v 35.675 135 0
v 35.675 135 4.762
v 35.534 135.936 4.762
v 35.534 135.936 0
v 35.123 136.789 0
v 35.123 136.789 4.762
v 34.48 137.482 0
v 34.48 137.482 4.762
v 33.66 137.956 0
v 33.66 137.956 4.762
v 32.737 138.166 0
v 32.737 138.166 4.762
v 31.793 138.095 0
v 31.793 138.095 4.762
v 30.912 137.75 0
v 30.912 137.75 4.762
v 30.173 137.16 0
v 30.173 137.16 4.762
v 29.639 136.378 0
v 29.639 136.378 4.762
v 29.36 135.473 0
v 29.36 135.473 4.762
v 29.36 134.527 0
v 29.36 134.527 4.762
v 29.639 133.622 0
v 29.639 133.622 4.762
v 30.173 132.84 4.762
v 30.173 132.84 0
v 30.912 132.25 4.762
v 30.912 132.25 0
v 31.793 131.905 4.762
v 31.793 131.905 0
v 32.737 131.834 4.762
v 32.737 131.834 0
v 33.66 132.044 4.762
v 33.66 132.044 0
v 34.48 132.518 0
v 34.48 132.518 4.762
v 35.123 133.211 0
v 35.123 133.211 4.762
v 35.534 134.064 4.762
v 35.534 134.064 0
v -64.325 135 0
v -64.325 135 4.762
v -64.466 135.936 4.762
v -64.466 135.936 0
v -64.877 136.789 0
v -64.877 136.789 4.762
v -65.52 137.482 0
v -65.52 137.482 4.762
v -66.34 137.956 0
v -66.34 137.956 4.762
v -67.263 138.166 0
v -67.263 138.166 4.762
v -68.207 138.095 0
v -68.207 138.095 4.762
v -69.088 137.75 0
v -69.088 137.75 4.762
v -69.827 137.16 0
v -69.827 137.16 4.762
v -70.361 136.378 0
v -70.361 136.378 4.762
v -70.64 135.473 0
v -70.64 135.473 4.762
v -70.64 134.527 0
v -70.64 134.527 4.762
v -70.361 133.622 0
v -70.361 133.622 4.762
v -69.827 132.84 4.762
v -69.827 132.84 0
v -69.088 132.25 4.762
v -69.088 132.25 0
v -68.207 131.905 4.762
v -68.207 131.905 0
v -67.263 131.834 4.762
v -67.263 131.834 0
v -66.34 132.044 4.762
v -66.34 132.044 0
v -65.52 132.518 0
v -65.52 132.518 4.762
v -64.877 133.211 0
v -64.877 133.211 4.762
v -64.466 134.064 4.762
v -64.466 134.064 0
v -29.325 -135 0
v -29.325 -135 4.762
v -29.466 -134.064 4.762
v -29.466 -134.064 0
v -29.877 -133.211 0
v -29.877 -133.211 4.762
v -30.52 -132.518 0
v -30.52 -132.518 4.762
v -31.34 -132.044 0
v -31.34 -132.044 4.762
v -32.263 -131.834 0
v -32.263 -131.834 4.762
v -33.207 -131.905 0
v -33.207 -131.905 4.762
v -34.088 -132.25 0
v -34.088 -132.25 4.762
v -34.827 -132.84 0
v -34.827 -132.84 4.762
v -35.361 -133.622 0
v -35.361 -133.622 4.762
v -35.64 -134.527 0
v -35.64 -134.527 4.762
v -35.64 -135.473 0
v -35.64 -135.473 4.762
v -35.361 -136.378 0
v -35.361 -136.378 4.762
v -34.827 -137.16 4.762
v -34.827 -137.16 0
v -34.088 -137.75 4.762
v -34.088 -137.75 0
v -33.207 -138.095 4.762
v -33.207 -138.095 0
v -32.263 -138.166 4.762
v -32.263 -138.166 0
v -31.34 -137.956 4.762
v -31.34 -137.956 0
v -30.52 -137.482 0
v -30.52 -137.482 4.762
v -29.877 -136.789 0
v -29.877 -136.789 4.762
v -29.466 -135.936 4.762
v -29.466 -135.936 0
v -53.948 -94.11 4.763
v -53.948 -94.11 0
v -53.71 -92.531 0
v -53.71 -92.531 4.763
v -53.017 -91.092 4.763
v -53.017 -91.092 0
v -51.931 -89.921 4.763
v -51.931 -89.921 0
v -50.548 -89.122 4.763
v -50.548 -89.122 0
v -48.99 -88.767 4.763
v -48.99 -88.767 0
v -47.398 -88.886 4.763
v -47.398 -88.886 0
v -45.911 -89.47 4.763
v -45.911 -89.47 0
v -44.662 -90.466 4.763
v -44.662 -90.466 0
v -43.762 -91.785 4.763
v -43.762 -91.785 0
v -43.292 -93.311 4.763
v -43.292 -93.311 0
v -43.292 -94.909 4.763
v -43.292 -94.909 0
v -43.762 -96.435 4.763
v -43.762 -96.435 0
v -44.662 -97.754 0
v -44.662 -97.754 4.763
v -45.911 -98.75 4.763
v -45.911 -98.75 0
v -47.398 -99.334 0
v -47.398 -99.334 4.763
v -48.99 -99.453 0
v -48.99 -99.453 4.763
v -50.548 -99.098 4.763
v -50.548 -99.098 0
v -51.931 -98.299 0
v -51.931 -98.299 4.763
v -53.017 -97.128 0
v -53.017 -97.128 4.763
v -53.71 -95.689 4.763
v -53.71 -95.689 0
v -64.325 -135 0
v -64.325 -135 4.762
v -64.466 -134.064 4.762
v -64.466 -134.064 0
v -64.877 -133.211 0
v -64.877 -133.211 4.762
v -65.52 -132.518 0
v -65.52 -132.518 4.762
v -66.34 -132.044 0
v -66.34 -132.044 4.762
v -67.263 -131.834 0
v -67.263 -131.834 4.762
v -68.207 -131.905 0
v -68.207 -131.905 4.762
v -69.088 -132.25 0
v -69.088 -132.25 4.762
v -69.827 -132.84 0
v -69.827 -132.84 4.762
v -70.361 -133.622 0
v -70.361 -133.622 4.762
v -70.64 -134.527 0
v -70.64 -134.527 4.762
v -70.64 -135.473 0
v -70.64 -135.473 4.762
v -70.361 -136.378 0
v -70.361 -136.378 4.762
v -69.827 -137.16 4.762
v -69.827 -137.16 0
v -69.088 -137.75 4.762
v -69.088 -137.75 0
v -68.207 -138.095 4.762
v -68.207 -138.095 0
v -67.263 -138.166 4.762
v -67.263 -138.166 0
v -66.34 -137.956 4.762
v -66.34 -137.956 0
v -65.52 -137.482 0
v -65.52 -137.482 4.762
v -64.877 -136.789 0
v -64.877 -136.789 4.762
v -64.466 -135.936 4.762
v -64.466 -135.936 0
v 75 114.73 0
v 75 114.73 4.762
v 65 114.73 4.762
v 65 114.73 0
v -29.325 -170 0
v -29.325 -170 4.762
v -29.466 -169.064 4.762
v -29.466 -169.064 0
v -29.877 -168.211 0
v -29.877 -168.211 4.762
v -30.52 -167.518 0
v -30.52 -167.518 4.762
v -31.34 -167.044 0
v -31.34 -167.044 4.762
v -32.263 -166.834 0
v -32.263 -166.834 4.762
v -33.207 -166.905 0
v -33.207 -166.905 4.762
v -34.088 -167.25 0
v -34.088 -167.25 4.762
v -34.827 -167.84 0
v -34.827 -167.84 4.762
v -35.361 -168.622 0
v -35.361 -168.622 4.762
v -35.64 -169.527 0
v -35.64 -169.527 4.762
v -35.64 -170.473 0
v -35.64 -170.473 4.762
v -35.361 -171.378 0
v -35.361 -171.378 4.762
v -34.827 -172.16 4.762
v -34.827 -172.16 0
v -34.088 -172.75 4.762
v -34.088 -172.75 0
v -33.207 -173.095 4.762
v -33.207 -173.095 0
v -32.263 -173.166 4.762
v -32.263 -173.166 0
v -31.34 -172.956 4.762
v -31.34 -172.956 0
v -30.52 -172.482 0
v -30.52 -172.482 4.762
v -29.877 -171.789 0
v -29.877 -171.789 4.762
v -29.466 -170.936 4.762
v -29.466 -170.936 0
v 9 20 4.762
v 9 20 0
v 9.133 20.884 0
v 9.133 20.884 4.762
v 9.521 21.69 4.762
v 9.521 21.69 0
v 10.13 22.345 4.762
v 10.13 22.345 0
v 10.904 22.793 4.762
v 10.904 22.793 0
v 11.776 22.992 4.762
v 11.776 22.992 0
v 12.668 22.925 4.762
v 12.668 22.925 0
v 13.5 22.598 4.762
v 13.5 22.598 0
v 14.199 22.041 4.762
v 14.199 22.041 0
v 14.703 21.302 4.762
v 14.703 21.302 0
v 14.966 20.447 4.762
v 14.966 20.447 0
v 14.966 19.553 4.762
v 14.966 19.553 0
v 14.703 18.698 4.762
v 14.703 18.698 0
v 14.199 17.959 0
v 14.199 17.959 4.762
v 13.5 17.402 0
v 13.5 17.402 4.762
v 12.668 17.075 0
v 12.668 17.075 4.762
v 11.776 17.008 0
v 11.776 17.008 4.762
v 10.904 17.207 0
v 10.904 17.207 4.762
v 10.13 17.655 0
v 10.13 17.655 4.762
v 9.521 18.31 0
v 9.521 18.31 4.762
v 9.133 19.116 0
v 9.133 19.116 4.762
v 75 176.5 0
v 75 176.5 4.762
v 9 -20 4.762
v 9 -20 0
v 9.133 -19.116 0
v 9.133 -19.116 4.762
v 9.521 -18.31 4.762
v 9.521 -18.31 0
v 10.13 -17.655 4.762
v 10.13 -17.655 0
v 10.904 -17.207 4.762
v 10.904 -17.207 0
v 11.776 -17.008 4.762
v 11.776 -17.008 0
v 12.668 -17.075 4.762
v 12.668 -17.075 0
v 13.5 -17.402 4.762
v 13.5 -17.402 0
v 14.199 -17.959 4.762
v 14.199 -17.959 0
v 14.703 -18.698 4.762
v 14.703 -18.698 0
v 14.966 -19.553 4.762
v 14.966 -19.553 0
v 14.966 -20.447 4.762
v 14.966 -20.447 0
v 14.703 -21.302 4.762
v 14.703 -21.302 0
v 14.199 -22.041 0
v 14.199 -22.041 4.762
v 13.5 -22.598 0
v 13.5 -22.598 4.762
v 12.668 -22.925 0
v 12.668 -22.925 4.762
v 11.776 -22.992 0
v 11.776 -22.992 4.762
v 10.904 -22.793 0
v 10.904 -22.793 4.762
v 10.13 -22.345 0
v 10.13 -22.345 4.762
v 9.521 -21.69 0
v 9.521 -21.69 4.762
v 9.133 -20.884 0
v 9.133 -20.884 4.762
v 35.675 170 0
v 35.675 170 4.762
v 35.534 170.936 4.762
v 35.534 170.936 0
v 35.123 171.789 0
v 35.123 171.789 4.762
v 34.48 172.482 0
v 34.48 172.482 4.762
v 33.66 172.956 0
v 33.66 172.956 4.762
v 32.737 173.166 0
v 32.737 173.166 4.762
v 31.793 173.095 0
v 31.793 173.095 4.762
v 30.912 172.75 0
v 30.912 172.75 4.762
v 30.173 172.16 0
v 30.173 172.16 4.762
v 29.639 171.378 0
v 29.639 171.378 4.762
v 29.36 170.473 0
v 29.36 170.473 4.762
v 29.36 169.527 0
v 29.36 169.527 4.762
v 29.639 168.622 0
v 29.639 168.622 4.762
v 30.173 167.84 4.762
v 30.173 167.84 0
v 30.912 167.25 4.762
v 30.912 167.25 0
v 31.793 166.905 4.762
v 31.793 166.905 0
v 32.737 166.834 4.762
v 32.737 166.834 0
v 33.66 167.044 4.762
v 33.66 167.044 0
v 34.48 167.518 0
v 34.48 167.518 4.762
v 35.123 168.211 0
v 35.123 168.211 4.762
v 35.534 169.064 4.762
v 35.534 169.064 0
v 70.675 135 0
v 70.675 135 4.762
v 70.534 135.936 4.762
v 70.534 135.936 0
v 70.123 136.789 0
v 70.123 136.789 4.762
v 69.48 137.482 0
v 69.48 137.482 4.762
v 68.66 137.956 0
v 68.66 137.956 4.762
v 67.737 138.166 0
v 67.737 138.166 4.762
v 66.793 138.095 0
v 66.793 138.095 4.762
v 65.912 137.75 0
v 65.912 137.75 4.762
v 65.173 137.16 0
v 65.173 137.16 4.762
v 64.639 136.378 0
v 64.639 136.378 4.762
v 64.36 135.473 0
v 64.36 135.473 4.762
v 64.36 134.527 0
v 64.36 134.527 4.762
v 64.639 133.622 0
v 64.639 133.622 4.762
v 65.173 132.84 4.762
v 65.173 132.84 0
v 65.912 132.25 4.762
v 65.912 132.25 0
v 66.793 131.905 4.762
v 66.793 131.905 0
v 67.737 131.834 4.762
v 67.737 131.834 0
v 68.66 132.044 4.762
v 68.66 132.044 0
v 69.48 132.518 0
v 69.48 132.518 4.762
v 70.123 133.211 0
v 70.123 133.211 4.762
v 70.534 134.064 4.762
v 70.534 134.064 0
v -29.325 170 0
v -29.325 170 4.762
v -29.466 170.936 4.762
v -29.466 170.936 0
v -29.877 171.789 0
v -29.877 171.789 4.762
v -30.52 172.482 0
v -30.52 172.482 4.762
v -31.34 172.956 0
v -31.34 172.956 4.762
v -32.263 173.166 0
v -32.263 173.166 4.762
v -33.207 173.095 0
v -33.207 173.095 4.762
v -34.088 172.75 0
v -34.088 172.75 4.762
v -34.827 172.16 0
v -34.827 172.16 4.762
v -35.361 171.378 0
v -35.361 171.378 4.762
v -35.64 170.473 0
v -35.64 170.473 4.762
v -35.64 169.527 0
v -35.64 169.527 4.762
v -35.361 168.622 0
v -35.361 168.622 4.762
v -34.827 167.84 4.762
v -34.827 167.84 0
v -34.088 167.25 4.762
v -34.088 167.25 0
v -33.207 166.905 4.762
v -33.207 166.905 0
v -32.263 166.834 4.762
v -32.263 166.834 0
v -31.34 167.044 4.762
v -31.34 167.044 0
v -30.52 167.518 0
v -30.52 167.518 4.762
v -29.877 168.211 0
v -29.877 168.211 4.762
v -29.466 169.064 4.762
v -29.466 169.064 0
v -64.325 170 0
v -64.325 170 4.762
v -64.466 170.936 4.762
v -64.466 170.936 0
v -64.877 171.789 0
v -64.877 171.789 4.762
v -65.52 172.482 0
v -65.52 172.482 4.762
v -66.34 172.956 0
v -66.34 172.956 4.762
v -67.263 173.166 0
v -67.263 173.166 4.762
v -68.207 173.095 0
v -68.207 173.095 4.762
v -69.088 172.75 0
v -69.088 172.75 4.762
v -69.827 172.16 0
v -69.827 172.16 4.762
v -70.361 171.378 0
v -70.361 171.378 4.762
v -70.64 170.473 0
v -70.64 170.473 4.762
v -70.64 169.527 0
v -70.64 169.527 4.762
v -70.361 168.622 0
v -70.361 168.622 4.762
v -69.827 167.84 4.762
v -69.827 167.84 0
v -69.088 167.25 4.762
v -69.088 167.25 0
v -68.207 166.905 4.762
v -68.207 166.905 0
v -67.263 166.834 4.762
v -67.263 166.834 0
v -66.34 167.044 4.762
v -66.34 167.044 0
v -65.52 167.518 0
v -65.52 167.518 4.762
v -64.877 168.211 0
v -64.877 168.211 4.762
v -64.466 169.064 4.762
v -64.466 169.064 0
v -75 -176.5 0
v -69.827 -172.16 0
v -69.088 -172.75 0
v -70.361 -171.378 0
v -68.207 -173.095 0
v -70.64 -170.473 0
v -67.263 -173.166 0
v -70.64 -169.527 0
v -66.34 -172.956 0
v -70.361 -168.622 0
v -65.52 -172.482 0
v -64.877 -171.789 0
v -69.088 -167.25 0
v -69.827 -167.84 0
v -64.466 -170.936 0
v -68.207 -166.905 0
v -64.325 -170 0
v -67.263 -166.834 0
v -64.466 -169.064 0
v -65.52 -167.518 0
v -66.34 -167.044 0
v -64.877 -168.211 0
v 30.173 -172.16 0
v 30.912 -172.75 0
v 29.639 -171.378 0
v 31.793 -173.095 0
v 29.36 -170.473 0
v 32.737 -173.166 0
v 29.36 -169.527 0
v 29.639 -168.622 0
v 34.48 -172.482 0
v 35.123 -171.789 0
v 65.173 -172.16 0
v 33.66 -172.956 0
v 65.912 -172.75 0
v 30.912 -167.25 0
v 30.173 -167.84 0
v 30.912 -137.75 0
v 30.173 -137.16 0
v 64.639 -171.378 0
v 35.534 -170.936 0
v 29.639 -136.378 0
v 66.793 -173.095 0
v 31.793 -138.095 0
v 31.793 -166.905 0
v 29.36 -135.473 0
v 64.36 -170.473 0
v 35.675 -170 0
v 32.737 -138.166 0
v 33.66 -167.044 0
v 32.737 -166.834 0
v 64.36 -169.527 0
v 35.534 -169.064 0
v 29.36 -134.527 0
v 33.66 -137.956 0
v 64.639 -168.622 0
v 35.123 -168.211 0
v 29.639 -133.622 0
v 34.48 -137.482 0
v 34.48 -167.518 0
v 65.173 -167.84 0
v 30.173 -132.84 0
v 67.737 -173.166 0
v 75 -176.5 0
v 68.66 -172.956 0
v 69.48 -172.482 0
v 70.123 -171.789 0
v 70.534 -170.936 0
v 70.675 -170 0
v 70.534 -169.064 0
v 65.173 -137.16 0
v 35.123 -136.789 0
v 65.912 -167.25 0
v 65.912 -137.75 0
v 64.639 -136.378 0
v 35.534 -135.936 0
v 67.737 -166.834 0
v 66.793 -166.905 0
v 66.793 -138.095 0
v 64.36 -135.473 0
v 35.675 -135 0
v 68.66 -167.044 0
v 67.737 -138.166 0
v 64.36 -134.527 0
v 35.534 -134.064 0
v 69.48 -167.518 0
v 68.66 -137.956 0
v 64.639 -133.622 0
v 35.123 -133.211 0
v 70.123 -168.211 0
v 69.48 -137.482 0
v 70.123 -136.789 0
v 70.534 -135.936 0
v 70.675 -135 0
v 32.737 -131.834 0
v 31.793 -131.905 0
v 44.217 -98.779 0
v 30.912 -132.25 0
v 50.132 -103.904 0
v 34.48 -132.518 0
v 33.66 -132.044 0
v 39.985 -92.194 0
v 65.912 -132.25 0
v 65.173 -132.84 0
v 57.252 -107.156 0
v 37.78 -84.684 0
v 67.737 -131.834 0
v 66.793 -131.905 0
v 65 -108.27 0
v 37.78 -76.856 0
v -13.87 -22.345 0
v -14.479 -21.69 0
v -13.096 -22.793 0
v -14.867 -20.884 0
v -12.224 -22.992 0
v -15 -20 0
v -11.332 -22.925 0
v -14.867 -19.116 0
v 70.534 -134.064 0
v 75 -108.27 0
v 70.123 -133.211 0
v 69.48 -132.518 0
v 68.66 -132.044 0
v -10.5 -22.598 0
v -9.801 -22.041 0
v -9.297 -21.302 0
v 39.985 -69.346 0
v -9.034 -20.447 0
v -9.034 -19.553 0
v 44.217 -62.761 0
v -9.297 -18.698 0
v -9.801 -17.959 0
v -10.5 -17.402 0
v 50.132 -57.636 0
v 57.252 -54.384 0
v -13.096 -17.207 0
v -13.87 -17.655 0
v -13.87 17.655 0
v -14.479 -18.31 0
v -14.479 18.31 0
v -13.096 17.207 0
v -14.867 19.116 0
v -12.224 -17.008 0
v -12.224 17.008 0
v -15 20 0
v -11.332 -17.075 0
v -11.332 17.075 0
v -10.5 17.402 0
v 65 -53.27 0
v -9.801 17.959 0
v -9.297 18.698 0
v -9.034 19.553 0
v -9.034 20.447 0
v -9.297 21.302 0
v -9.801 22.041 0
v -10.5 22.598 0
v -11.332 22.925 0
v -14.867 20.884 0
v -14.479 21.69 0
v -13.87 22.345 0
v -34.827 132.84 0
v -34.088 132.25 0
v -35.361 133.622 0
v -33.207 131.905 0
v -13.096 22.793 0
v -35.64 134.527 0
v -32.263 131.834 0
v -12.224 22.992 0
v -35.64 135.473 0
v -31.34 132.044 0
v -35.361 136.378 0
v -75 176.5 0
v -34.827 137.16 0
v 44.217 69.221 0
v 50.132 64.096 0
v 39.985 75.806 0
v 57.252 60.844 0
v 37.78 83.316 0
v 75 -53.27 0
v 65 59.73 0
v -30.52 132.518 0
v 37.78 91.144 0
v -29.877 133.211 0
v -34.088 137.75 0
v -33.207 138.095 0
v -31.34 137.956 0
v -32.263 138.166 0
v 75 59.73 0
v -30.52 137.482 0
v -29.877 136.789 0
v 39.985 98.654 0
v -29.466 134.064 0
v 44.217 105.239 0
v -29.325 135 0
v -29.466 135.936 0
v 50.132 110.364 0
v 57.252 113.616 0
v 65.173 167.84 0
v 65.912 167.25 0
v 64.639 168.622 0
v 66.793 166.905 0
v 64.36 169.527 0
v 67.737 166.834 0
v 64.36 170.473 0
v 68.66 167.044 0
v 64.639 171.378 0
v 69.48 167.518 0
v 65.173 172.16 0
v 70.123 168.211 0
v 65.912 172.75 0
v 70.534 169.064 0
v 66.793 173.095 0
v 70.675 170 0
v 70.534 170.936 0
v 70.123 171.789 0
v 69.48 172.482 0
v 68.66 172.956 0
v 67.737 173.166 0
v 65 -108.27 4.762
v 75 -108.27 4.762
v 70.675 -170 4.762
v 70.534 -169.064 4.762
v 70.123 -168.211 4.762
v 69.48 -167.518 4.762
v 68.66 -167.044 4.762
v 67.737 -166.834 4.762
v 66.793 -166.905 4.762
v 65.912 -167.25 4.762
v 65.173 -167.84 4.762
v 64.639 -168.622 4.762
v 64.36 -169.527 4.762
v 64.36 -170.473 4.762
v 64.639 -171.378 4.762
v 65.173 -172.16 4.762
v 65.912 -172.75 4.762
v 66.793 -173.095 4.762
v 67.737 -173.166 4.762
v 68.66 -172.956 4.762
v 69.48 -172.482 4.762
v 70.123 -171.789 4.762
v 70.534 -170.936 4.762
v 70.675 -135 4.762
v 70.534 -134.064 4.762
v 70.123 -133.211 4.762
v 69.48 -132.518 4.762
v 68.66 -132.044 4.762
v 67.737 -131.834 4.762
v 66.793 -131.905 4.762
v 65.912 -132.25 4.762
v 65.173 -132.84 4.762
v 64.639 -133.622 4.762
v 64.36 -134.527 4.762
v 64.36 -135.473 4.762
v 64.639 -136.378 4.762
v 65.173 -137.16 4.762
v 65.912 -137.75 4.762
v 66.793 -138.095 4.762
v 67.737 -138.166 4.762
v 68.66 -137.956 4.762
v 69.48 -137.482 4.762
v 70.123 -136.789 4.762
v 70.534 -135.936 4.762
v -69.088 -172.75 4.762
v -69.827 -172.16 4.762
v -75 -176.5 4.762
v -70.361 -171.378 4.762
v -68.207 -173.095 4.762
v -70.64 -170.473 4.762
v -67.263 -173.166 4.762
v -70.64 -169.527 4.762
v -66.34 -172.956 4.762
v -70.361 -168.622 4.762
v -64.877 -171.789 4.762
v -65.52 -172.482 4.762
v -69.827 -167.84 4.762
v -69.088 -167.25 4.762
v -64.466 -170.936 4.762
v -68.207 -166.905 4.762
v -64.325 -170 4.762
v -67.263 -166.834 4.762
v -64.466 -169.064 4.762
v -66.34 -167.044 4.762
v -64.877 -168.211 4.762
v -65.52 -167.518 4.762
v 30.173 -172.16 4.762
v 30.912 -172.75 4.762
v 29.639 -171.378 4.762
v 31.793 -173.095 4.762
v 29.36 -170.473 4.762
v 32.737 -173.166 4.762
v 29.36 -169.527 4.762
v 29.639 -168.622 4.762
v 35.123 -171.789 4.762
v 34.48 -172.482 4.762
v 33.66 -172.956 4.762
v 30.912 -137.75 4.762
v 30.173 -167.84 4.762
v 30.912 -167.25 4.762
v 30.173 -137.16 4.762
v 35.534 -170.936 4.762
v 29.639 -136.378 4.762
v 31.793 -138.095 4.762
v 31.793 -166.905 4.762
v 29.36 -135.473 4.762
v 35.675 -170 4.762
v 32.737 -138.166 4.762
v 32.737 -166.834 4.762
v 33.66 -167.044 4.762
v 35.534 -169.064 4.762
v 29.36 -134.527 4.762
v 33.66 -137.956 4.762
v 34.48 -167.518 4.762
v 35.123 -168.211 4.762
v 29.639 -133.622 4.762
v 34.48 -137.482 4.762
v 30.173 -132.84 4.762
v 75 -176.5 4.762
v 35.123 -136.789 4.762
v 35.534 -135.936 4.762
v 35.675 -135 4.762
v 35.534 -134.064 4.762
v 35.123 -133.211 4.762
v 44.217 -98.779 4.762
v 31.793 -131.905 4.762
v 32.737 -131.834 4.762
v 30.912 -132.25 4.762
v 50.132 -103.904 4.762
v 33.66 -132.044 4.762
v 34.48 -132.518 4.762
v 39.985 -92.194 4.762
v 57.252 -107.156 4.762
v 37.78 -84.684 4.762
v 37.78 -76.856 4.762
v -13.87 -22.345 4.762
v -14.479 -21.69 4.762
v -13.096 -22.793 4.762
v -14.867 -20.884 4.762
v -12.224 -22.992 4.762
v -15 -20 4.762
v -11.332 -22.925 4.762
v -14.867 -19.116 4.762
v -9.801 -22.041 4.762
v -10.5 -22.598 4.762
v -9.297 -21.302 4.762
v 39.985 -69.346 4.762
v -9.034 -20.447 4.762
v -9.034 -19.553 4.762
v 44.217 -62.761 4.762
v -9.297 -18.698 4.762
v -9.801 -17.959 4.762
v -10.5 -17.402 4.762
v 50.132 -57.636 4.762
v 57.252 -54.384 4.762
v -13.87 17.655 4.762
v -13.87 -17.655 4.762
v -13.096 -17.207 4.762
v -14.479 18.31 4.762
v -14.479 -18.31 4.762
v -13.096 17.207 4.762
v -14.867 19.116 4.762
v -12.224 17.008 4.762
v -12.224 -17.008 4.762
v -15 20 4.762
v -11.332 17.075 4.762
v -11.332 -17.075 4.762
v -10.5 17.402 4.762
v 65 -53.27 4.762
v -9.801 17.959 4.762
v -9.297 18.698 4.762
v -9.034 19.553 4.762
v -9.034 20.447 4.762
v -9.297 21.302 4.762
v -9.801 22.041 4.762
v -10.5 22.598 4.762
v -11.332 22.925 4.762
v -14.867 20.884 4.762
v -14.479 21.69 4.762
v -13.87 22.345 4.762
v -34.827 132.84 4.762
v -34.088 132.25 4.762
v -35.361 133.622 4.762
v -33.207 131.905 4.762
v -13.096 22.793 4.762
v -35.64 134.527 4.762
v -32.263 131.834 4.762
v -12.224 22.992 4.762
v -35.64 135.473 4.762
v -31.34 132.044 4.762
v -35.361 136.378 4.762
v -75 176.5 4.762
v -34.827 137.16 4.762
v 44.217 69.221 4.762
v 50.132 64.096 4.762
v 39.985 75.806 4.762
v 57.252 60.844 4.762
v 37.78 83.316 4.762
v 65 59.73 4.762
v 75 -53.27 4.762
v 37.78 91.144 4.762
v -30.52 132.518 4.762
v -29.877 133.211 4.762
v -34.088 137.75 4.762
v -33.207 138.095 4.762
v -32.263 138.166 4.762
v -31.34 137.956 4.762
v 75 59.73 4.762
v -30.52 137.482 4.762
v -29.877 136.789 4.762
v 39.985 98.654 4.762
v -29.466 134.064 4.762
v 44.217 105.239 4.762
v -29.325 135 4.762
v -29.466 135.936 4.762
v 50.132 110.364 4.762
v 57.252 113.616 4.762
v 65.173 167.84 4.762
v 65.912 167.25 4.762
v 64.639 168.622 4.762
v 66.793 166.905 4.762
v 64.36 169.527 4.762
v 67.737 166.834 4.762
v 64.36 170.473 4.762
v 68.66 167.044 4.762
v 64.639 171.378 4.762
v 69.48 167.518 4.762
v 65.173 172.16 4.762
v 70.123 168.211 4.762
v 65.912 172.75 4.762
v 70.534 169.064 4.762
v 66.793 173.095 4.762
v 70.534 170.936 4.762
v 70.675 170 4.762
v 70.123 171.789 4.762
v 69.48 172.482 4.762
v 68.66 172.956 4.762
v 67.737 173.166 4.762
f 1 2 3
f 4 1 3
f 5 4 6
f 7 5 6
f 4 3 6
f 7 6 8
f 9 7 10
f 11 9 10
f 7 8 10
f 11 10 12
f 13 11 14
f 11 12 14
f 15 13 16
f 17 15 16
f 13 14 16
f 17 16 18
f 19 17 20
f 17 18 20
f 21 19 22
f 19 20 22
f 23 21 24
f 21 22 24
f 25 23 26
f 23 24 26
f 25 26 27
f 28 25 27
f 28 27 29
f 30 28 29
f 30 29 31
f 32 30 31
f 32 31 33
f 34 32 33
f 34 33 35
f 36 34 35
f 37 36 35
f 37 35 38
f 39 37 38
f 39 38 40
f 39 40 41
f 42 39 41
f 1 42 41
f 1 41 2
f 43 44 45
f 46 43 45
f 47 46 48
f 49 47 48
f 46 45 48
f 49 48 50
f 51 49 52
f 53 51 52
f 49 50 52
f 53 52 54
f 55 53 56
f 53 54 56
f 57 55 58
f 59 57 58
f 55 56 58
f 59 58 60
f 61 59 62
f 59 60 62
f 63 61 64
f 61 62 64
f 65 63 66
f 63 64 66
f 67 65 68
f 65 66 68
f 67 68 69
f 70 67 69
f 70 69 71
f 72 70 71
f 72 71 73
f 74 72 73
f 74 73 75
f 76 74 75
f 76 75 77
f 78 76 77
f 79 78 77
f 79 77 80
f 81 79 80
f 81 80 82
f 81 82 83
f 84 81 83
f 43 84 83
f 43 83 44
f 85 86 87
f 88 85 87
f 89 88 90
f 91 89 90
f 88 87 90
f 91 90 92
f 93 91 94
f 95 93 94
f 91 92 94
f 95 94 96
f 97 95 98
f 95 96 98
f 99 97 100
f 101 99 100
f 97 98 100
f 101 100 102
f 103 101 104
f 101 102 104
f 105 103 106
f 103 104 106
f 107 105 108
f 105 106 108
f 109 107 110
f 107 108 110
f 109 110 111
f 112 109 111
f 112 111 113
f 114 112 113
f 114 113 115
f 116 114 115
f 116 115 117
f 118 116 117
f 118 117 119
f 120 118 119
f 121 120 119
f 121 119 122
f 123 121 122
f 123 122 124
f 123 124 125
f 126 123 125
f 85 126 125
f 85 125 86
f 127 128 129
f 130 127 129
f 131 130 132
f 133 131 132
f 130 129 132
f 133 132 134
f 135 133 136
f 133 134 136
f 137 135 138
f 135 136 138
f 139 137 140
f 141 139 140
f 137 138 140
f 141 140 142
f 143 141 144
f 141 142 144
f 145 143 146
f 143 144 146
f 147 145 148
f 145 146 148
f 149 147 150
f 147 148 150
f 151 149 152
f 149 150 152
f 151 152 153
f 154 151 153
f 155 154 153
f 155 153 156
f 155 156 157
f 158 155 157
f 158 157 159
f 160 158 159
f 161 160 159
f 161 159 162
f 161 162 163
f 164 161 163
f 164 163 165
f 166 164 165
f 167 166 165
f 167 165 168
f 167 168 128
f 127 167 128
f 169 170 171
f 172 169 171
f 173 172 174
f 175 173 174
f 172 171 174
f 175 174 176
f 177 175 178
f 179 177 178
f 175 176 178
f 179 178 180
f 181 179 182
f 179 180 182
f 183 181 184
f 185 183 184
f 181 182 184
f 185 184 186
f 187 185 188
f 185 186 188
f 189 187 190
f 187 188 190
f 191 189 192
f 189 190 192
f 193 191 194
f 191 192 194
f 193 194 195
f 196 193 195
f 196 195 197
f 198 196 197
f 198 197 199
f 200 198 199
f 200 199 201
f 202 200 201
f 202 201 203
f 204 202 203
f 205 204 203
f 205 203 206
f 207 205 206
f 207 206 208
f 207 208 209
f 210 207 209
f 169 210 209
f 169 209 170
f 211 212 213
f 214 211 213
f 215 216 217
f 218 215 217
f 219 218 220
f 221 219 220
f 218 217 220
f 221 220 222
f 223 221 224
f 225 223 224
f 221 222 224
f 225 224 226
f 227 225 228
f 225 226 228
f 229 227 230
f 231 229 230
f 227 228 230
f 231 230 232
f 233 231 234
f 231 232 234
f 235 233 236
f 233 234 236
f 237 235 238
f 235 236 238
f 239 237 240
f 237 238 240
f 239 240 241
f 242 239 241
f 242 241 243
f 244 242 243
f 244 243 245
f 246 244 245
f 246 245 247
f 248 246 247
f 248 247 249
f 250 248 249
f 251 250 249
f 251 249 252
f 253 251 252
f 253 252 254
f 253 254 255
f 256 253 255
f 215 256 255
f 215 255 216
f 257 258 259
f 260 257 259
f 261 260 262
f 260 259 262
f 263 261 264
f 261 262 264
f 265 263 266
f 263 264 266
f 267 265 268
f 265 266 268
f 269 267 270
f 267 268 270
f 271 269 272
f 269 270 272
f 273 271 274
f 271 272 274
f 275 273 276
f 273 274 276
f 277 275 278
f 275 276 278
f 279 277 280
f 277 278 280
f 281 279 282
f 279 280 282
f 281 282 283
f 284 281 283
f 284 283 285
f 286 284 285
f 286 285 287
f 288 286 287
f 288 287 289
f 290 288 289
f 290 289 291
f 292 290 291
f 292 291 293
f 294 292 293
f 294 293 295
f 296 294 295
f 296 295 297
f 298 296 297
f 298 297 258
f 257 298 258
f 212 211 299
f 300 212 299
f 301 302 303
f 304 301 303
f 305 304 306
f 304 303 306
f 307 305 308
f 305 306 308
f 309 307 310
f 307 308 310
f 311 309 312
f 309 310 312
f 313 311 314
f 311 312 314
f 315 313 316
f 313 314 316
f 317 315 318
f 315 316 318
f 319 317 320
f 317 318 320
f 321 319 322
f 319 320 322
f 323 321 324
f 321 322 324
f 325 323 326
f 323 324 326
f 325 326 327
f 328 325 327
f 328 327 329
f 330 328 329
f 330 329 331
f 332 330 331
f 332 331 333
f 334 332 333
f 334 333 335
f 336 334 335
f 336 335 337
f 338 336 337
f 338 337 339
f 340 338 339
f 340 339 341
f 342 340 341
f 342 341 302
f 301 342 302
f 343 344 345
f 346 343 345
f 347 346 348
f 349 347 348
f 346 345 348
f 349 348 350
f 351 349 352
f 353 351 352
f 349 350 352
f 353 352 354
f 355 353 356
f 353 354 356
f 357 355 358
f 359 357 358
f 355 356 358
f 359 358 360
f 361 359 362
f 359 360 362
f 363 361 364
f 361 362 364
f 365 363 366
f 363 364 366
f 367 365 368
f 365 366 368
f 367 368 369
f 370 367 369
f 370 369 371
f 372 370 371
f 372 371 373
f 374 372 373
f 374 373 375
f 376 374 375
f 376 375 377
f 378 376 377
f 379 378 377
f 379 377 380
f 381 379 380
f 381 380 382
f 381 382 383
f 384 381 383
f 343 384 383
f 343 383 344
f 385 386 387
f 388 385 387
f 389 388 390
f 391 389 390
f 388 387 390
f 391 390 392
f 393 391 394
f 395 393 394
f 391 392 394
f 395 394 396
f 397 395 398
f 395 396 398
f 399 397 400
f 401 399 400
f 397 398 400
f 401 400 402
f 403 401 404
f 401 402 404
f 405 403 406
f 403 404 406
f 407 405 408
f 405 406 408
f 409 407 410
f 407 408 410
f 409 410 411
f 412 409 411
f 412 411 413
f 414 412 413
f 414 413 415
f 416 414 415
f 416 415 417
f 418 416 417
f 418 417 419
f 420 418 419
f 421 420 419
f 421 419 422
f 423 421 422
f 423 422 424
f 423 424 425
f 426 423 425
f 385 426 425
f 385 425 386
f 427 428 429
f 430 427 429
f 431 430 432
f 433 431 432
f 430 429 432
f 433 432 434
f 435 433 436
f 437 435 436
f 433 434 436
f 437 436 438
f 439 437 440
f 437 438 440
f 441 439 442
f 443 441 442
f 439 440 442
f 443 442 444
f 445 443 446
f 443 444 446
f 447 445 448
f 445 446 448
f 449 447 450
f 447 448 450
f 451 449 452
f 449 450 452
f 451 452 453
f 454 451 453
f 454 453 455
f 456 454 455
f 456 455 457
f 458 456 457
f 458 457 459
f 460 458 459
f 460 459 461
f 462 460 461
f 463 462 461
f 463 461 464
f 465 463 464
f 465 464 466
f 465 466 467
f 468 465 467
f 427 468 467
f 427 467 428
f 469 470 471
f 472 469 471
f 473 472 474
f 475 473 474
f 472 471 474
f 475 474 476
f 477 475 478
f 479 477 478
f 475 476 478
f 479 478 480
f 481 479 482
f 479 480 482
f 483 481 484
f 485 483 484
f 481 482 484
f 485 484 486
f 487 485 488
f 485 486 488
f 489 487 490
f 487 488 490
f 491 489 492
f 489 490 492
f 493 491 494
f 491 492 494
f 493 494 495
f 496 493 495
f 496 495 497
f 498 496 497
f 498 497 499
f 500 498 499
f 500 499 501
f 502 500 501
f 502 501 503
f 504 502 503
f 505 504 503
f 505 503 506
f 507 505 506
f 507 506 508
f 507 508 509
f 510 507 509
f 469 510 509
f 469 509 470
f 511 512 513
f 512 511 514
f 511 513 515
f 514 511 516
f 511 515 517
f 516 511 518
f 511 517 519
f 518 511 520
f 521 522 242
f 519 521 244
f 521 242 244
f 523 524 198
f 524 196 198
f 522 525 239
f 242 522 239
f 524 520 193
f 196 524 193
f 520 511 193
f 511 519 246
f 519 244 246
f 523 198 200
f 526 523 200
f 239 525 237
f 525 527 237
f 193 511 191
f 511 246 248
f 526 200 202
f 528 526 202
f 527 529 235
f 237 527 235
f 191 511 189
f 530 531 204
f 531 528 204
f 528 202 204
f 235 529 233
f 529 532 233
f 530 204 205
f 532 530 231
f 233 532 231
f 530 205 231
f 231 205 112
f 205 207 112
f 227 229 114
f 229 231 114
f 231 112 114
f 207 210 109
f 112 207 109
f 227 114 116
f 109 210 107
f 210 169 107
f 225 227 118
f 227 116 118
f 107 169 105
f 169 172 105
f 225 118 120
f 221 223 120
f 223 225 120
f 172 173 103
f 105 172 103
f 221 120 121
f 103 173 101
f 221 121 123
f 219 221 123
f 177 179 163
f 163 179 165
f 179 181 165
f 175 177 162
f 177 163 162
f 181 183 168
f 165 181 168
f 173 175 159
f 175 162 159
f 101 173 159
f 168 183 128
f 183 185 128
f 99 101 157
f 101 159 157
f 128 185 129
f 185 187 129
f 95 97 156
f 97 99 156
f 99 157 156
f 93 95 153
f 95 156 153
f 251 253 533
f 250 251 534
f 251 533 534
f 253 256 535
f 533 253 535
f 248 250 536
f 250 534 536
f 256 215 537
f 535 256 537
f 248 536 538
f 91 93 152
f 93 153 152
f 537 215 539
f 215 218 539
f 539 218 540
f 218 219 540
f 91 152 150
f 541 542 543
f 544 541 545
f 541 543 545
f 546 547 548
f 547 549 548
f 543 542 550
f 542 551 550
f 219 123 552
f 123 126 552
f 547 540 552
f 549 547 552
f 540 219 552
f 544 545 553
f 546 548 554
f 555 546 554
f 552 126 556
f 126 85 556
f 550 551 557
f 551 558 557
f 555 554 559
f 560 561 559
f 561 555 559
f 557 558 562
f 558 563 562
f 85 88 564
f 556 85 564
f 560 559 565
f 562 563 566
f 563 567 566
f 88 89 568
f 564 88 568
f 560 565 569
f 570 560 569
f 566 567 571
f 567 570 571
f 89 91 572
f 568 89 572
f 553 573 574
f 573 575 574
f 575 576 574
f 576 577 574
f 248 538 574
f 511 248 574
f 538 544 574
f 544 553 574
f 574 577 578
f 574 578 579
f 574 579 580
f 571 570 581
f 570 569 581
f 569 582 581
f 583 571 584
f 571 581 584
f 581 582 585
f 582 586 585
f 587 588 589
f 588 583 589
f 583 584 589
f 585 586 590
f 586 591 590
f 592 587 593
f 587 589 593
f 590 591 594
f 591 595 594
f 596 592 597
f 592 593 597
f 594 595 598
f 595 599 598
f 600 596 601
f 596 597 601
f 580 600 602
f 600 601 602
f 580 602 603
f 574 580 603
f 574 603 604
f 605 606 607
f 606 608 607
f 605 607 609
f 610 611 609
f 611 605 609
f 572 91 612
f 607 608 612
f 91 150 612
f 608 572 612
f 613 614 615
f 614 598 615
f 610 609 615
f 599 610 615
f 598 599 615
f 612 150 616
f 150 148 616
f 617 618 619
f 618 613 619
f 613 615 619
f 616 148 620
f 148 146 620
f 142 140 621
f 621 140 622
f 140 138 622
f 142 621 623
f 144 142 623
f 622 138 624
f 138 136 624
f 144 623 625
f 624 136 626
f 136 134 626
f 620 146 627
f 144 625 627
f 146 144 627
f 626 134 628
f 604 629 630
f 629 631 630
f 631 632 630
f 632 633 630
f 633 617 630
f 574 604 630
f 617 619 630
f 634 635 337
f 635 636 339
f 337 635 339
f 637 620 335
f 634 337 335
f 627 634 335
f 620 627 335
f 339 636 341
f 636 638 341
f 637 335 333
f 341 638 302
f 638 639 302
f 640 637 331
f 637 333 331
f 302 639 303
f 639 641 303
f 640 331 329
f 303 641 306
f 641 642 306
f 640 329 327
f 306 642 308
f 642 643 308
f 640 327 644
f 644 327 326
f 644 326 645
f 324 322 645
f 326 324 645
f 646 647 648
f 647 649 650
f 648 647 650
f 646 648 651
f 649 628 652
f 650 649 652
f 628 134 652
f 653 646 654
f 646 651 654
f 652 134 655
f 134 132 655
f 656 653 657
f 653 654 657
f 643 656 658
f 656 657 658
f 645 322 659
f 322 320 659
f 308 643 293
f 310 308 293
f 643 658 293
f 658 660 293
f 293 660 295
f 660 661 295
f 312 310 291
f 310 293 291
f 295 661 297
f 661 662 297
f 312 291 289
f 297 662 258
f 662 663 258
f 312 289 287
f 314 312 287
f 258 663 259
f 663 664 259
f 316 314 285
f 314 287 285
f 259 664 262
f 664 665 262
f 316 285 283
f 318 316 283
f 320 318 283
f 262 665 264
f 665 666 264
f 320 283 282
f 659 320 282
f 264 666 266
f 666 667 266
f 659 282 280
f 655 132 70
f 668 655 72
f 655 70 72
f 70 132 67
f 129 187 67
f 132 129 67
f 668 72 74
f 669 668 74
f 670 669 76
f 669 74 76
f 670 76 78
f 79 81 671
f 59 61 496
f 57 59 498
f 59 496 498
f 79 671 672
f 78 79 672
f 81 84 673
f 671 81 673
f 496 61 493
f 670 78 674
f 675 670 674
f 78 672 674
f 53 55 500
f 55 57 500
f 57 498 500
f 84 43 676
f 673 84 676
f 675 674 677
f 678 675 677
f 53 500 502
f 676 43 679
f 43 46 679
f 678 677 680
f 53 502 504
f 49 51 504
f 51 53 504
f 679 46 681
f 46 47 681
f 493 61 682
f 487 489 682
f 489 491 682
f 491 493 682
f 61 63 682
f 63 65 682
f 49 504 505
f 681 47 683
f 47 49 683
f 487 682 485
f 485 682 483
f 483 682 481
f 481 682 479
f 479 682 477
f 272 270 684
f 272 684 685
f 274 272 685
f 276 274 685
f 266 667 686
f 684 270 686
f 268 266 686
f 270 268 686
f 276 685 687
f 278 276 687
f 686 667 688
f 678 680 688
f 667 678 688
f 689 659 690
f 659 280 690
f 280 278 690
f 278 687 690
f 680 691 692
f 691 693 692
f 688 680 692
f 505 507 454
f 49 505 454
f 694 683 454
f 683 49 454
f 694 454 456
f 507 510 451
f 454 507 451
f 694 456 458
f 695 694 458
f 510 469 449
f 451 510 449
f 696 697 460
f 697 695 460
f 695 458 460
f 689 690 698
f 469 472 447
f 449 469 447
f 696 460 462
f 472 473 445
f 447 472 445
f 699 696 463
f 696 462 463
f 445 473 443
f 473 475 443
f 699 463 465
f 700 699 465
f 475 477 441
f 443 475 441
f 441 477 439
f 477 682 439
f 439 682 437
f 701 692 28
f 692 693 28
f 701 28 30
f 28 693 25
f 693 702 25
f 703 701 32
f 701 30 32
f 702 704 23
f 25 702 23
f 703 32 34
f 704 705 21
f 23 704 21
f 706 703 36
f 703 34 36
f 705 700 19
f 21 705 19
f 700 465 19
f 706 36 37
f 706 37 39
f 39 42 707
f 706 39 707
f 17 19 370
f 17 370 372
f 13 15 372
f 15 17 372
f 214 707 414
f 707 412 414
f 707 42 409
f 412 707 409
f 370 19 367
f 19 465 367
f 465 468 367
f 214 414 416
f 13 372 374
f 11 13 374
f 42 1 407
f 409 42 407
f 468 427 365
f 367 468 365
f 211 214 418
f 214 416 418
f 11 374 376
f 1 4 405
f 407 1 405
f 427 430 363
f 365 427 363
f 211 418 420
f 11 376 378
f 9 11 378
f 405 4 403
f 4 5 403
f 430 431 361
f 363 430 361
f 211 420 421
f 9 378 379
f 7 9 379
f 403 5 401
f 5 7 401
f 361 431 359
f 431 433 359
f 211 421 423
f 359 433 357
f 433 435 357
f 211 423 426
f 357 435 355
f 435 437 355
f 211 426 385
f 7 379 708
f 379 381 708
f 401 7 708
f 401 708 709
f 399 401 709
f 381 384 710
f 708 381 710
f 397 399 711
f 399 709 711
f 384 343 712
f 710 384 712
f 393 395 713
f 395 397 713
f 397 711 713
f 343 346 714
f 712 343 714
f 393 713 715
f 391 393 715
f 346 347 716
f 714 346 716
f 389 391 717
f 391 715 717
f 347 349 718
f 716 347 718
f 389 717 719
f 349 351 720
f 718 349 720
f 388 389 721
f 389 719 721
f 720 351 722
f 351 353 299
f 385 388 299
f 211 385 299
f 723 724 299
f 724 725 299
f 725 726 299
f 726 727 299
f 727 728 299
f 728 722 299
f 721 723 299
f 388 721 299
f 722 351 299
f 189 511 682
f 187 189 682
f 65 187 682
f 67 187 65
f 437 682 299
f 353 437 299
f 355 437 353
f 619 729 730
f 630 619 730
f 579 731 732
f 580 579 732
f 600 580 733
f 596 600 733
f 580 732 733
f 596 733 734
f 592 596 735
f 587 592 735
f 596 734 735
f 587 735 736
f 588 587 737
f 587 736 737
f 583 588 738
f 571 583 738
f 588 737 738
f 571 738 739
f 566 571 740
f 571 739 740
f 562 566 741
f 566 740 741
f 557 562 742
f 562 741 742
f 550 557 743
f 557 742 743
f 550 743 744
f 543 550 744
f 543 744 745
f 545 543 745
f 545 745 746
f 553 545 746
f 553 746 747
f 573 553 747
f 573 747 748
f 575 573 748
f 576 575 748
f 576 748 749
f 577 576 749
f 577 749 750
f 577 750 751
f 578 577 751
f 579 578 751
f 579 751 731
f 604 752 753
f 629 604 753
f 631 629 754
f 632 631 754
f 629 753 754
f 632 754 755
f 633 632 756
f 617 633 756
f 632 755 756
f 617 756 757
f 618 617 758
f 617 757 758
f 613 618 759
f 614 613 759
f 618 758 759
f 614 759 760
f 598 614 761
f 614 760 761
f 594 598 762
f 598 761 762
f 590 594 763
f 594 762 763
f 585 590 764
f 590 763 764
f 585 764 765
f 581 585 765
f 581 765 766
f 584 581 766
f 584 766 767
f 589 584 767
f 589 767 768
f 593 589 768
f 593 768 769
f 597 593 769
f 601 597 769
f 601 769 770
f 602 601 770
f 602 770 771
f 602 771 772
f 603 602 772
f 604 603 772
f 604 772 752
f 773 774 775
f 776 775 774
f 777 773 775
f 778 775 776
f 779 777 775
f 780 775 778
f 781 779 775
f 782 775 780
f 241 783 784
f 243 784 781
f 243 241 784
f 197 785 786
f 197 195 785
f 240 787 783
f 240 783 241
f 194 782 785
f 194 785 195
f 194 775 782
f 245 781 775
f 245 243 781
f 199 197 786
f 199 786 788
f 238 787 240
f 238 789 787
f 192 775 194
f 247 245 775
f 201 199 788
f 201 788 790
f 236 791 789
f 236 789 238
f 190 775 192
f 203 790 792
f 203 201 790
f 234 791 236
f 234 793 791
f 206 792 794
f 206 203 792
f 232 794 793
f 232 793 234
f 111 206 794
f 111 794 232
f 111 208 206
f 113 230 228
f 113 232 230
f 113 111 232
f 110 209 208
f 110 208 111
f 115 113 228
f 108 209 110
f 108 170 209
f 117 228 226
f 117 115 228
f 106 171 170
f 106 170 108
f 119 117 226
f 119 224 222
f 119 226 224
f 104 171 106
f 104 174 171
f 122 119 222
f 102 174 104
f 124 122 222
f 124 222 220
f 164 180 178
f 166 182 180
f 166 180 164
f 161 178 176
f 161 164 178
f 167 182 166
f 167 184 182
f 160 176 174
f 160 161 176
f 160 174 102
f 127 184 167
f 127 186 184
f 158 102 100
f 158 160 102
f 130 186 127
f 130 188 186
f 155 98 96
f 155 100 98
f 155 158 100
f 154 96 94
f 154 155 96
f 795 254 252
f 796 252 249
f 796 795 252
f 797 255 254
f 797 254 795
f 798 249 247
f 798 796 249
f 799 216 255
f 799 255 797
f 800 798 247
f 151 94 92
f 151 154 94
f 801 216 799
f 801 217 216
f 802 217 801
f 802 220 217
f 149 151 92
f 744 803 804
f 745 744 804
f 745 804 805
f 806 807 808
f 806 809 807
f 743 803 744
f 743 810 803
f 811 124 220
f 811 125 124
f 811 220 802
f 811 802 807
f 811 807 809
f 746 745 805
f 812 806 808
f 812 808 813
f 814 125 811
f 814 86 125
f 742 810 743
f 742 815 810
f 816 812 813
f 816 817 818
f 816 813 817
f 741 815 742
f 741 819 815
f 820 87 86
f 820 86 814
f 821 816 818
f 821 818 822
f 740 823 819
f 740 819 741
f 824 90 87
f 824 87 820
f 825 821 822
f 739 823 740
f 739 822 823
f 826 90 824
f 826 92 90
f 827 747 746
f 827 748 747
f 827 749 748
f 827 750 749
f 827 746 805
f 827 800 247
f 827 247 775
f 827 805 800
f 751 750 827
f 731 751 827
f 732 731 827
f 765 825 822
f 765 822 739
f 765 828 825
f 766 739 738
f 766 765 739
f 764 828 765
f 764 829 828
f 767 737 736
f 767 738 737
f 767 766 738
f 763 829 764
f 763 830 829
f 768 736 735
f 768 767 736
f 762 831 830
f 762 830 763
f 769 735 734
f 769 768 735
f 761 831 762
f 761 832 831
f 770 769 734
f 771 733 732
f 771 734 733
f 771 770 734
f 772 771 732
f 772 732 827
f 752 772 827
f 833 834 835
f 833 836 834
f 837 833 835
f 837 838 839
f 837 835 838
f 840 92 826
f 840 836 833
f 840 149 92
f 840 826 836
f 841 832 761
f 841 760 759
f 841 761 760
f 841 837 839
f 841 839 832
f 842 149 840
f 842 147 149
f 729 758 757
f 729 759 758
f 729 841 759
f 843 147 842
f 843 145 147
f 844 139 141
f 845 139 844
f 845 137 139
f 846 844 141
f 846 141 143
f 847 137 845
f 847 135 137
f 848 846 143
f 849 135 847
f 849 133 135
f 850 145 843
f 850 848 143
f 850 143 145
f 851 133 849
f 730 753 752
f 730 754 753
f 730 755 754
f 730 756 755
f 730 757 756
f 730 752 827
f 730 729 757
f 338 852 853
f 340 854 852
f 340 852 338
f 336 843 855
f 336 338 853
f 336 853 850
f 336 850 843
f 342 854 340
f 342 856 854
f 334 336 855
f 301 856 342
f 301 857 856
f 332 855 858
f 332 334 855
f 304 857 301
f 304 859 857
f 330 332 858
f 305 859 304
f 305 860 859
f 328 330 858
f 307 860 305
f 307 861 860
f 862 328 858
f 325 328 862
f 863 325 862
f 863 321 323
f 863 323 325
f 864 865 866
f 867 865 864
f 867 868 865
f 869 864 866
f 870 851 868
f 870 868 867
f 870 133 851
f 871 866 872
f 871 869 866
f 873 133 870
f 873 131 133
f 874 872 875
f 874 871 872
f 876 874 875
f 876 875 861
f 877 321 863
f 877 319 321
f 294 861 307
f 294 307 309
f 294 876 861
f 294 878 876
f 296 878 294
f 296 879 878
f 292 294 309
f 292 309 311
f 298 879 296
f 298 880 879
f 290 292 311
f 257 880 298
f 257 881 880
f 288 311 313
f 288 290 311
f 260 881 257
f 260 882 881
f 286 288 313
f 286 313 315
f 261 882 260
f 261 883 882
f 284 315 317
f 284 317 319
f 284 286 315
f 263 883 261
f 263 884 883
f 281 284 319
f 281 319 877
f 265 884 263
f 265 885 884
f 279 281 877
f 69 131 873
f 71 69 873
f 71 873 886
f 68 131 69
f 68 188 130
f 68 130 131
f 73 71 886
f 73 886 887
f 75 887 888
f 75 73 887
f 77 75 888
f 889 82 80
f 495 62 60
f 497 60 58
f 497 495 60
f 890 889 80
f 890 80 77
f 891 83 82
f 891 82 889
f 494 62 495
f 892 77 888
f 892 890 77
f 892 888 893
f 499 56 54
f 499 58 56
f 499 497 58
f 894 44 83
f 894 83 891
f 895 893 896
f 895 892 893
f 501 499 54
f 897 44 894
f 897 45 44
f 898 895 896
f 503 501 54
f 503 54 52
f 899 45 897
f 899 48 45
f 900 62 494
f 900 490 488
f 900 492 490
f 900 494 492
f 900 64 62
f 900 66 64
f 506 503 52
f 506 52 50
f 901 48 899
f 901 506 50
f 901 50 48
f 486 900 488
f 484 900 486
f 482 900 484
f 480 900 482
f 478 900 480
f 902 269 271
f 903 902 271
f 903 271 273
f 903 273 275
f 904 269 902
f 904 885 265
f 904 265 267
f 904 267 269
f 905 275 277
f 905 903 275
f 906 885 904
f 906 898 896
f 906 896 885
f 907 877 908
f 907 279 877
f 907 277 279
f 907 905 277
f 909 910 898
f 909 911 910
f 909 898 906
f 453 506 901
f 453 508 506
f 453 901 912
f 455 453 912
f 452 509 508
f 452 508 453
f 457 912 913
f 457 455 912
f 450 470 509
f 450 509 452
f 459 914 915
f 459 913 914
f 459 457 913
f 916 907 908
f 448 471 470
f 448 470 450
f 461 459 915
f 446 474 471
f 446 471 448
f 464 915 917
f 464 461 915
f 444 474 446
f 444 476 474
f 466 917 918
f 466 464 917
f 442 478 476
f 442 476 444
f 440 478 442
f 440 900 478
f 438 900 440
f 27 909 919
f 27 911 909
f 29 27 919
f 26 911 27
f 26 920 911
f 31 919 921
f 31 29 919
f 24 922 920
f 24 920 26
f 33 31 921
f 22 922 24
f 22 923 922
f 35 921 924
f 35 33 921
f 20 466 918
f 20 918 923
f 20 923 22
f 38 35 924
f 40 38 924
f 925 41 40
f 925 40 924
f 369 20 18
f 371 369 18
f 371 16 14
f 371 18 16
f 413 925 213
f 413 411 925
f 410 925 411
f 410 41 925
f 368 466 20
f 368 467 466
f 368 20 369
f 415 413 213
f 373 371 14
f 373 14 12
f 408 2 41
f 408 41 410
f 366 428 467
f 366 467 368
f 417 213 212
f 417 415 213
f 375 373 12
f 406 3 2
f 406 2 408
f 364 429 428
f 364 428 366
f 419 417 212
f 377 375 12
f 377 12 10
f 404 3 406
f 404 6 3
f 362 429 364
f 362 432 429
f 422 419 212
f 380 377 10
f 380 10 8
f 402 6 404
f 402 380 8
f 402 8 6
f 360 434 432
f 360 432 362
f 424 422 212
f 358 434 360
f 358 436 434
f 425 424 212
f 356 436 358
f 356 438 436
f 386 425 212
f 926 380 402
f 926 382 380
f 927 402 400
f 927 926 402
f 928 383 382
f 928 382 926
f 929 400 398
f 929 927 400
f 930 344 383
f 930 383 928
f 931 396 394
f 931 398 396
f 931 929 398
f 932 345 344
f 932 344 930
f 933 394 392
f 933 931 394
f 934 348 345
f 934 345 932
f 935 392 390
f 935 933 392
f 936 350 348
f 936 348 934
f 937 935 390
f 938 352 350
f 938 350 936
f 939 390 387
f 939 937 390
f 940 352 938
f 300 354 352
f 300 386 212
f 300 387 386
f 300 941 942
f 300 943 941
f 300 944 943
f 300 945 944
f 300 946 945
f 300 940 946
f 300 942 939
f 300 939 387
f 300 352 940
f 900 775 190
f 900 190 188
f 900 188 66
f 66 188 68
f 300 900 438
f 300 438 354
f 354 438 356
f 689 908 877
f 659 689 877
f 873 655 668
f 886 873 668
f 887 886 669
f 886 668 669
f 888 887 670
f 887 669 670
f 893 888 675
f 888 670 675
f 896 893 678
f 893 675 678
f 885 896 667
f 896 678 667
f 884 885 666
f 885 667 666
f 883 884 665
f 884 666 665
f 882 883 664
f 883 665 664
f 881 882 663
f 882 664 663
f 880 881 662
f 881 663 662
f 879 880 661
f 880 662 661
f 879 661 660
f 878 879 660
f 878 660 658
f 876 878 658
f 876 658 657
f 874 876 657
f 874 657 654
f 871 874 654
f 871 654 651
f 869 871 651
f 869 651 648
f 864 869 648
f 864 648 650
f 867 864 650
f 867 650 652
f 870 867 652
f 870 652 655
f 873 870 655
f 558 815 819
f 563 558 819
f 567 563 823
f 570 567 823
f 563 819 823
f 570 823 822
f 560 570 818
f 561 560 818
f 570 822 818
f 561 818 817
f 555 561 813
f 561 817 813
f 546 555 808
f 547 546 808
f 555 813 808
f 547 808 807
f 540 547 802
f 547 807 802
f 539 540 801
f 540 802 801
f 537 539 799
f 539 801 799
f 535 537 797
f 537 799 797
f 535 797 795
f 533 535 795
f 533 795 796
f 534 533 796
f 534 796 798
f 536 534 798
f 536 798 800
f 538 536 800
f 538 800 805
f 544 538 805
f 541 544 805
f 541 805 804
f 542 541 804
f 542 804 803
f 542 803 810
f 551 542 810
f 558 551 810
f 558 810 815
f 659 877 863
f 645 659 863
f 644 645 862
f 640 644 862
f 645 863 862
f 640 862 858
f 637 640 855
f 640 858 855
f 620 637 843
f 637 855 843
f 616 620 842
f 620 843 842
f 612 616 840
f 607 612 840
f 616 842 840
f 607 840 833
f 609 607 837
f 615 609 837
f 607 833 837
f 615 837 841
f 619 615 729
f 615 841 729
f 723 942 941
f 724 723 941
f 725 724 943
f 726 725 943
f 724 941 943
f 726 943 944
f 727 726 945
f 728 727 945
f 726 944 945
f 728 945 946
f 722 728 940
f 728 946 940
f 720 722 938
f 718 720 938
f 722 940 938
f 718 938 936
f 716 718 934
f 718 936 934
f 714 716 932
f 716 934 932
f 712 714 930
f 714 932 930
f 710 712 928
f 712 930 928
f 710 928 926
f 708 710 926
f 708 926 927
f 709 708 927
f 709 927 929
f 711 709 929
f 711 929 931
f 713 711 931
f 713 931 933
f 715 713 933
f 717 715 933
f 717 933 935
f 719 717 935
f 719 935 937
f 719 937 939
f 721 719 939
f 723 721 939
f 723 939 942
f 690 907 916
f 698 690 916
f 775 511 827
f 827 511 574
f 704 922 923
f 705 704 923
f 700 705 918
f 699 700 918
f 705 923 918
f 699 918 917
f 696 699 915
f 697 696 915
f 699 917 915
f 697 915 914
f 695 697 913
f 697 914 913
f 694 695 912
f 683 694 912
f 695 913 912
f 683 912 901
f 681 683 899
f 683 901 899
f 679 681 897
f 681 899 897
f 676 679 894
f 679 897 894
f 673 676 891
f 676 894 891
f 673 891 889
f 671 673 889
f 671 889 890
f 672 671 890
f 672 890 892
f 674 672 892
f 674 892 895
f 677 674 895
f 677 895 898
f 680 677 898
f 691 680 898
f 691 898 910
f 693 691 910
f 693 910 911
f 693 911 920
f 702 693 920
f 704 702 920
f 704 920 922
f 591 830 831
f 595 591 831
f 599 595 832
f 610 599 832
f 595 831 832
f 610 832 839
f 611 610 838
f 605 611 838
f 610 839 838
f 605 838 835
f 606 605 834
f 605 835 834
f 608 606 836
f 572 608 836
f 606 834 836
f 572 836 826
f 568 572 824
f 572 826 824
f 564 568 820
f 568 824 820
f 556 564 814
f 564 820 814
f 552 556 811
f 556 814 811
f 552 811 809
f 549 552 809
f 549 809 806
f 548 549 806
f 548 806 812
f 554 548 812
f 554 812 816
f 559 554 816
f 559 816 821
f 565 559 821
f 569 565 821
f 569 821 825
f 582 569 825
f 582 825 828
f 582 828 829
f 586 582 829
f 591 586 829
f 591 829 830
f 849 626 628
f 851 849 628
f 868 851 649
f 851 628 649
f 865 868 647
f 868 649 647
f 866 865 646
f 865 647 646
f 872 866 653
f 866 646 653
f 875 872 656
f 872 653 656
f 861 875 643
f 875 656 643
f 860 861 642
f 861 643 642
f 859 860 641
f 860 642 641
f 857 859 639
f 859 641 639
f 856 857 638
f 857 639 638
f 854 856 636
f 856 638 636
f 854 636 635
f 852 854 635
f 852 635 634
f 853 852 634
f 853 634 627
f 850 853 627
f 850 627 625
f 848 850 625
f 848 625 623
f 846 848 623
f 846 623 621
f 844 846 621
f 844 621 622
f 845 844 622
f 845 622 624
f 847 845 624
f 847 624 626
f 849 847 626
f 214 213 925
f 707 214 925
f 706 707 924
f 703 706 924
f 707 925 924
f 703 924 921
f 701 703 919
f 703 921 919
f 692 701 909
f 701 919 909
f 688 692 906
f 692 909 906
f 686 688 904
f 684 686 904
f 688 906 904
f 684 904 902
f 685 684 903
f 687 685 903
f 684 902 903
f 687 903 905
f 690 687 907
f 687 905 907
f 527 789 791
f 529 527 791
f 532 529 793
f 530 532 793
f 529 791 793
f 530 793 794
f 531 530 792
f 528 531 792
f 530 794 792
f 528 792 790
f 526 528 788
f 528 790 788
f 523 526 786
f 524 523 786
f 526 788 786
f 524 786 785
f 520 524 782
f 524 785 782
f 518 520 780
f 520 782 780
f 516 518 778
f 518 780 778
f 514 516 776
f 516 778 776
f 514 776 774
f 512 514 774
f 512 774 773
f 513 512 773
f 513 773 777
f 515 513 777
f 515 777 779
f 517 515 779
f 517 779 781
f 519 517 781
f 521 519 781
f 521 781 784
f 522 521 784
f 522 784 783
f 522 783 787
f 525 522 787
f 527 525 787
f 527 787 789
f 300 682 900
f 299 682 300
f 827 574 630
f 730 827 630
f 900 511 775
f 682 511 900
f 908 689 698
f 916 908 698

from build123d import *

# Parameters (mm, degrees)
CROQUIS1_W                    = 150
CROQUIS1_H                    = 353
SALIENTE_EXTRUIR1_DEPTH       = 4.7625
CROQUIS2_R                    = 3.175
CORTAR_EXTRUIR1_DEPTH         = 192.833082148
CORTAR_EXTRUIR2_REACH         = 193.833
CROQUIS3_R                    = 3
CORTAR_EXTRUIR3_REACH         = 193.833
CROQUIS4_R                    = 5
CORTAR_EXTRUIR7_REACH         = 193.833
TALADRO_ROSCADO_1_2_134_D     = 10.71626
TALADRO_ROSCADO_1_2_134_DEPTH = 35.17
TALADRO_ROSCADO_1_2_134_TIP   = 3.219489309


with BuildPart() as part:
    # Croquis1 → Saliente-Extruir1 (new body)
    with BuildSketch(Plane.XY):
        Rectangle(CROQUIS1_W, CROQUIS1_H)
    extrude(amount=SALIENTE_EXTRUIR1_DEPTH)

    # Croquis2 → Cortar-Extruir1 (cut, through all)
    with BuildSketch(Plane.XY.offset(4.7625)):
        with Locations((-67.5, 170)):
            Circle(CROQUIS2_R)
        with Locations((-32.5, 170)):
            Circle(CROQUIS2_R)
        with Locations((-67.5, 135)):
            Circle(CROQUIS2_R)
        with Locations((-32.5, 135)):
            Circle(CROQUIS2_R)
        with Locations((32.5, 170)):
            Circle(CROQUIS2_R)
        with Locations((67.5, 170)):
            Circle(CROQUIS2_R)
        with Locations((32.5, 135)):
            Circle(CROQUIS2_R)
        with Locations((67.5, 135)):
            Circle(CROQUIS2_R)
        with Locations((-67.5, -135)):
            Circle(CROQUIS2_R)
        with Locations((-32.5, -135)):
            Circle(CROQUIS2_R)
        with Locations((-67.5, -170)):
            Circle(CROQUIS2_R)
        with Locations((-32.5, -170)):
            Circle(CROQUIS2_R)
        with Locations((32.5, -170)):
            Circle(CROQUIS2_R)
        with Locations((32.5, -135)):
            Circle(CROQUIS2_R)
        with Locations((67.5, -135)):
            Circle(CROQUIS2_R)
        with Locations((67.5, -170)):
            Circle(CROQUIS2_R)
    extrude(amount=-CORTAR_EXTRUIR1_DEPTH, mode=Mode.SUBTRACT)

    # Croquis3 → Cortar-Extruir2 (cut, up to next)
    with BuildSketch(Plane(origin=(0, 0, 0), x_dir=(-1, 0, 0), z_dir=(0, 0, -1)), mode=Mode.PRIVATE) as cortar_extruir2_sk1:
        with Locations((-12, 20)):
            Circle(CROQUIS3_R)
    cortar_extruir2_tool1 = extrude(cortar_extruir2_sk1.sketch, amount=-CORTAR_EXTRUIR2_REACH, mode=Mode.PRIVATE) & part.part
    # Croquis3 → Cortar-Extruir2 (cut, up to next)
    with BuildSketch(Plane(origin=(0, 0, 0), x_dir=(-1, 0, 0), z_dir=(0, 0, -1)), mode=Mode.PRIVATE) as cortar_extruir2_sk2:
        with Locations((12, 20)):
            Circle(CROQUIS3_R)
    cortar_extruir2_tool2 = extrude(cortar_extruir2_sk2.sketch, amount=-CORTAR_EXTRUIR2_REACH, mode=Mode.PRIVATE) & part.part
    # Croquis3 → Cortar-Extruir2 (cut, up to next)
    with BuildSketch(Plane(origin=(0, 0, 0), x_dir=(-1, 0, 0), z_dir=(0, 0, -1)), mode=Mode.PRIVATE) as cortar_extruir2_sk3:
        with Locations((12, -20)):
            Circle(CROQUIS3_R)
    cortar_extruir2_tool3 = extrude(cortar_extruir2_sk3.sketch, amount=-CORTAR_EXTRUIR2_REACH, mode=Mode.PRIVATE) & part.part
    # Croquis3 → Cortar-Extruir2 (cut, up to next)
    with BuildSketch(Plane(origin=(0, 0, 0), x_dir=(-1, 0, 0), z_dir=(0, 0, -1)), mode=Mode.PRIVATE) as cortar_extruir2_sk4:
        with Locations((-12, -20)):
            Circle(CROQUIS3_R)
    cortar_extruir2_tool4 = extrude(cortar_extruir2_sk4.sketch, amount=-CORTAR_EXTRUIR2_REACH, mode=Mode.PRIVATE) & part.part
    add(cortar_extruir2_tool1.solids().sort_by_distance((12, 20, 0))[0], mode=Mode.SUBTRACT)
    add(cortar_extruir2_tool2.solids().sort_by_distance((-12, 20, 0))[0], mode=Mode.SUBTRACT)
    add(cortar_extruir2_tool3.solids().sort_by_distance((-12, -20, 0))[0], mode=Mode.SUBTRACT)
    add(cortar_extruir2_tool4.solids().sort_by_distance((12, -20, 0))[0], mode=Mode.SUBTRACT)

    # Croquis4 → Cortar-Extruir3 (cut, up to next)
    with BuildSketch(Plane.XY.offset(4.7625), mode=Mode.PRIVATE) as cortar_extruir3_sk1:
        with Locations((-48.59, -94.11)):
            Circle(CROQUIS4_R)
    cortar_extruir3_tool1 = extrude(cortar_extruir3_sk1.sketch, amount=-CORTAR_EXTRUIR3_REACH, mode=Mode.PRIVATE) & part.part
    add(cortar_extruir3_tool1.solids().sort_by_distance((-48.59, -94.11, 4.7625))[0], mode=Mode.SUBTRACT)

    # Croquis8 → Cortar-Extruir7 (cut, up to next)
    with BuildSketch(Plane.XY.offset(4.7625), mode=Mode.PRIVATE) as cortar_extruir7_sk1:
        with BuildLine():
            Line((75, 114.73), (65, 114.73))
            ThreePointArc((65, 114.73), (37.5, 87.23), (65, 59.73))
            Line((65, 59.73), (75, 59.73))
            Line((75, 59.73), (75, 114.73))
        make_face()
    cortar_extruir7_tool1 = extrude(cortar_extruir7_sk1.sketch, amount=-CORTAR_EXTRUIR7_REACH, mode=Mode.PRIVATE) & part.part
    # Croquis8 → Cortar-Extruir7 (cut, up to next)
    with BuildSketch(Plane.XY.offset(4.7625), mode=Mode.PRIVATE) as cortar_extruir7_sk2:
        with BuildLine():
            Line((75, -53.27), (65, -53.27))
            ThreePointArc((65, -53.27), (37.5, -80.77), (65, -108.27))
            Line((65, -108.27), (75, -108.27))
            Line((75, -108.27), (75, -53.27))
        make_face()
    cortar_extruir7_tool2 = extrude(cortar_extruir7_sk2.sketch, amount=-CORTAR_EXTRUIR7_REACH, mode=Mode.PRIVATE) & part.part
    add(cortar_extruir7_tool1.solids().sort_by_distance((58.604644, 87.23, 4.7625))[0], mode=Mode.SUBTRACT)
    add(cortar_extruir7_tool2.solids().sort_by_distance((58.604644, -80.77, 4.7625))[0], mode=Mode.SUBTRACT)

    # Taladro roscado 1/2-134
    with Locations(Plane.XY.offset(4.7625)):
        with Locations((-48.59, -94.11)):
            Hole(TALADRO_ROSCADO_1_2_134_D / 2, depth=TALADRO_ROSCADO_1_2_134_DEPTH)
            with Locations((0, 0, -(TALADRO_ROSCADO_1_2_134_DEPTH + TALADRO_ROSCADO_1_2_134_TIP / 2))):  # 118° drill point
                Cone(0, TALADRO_ROSCADO_1_2_134_D / 2, TALADRO_ROSCADO_1_2_134_TIP, mode=Mode.SUBTRACT)


solid = part.part
